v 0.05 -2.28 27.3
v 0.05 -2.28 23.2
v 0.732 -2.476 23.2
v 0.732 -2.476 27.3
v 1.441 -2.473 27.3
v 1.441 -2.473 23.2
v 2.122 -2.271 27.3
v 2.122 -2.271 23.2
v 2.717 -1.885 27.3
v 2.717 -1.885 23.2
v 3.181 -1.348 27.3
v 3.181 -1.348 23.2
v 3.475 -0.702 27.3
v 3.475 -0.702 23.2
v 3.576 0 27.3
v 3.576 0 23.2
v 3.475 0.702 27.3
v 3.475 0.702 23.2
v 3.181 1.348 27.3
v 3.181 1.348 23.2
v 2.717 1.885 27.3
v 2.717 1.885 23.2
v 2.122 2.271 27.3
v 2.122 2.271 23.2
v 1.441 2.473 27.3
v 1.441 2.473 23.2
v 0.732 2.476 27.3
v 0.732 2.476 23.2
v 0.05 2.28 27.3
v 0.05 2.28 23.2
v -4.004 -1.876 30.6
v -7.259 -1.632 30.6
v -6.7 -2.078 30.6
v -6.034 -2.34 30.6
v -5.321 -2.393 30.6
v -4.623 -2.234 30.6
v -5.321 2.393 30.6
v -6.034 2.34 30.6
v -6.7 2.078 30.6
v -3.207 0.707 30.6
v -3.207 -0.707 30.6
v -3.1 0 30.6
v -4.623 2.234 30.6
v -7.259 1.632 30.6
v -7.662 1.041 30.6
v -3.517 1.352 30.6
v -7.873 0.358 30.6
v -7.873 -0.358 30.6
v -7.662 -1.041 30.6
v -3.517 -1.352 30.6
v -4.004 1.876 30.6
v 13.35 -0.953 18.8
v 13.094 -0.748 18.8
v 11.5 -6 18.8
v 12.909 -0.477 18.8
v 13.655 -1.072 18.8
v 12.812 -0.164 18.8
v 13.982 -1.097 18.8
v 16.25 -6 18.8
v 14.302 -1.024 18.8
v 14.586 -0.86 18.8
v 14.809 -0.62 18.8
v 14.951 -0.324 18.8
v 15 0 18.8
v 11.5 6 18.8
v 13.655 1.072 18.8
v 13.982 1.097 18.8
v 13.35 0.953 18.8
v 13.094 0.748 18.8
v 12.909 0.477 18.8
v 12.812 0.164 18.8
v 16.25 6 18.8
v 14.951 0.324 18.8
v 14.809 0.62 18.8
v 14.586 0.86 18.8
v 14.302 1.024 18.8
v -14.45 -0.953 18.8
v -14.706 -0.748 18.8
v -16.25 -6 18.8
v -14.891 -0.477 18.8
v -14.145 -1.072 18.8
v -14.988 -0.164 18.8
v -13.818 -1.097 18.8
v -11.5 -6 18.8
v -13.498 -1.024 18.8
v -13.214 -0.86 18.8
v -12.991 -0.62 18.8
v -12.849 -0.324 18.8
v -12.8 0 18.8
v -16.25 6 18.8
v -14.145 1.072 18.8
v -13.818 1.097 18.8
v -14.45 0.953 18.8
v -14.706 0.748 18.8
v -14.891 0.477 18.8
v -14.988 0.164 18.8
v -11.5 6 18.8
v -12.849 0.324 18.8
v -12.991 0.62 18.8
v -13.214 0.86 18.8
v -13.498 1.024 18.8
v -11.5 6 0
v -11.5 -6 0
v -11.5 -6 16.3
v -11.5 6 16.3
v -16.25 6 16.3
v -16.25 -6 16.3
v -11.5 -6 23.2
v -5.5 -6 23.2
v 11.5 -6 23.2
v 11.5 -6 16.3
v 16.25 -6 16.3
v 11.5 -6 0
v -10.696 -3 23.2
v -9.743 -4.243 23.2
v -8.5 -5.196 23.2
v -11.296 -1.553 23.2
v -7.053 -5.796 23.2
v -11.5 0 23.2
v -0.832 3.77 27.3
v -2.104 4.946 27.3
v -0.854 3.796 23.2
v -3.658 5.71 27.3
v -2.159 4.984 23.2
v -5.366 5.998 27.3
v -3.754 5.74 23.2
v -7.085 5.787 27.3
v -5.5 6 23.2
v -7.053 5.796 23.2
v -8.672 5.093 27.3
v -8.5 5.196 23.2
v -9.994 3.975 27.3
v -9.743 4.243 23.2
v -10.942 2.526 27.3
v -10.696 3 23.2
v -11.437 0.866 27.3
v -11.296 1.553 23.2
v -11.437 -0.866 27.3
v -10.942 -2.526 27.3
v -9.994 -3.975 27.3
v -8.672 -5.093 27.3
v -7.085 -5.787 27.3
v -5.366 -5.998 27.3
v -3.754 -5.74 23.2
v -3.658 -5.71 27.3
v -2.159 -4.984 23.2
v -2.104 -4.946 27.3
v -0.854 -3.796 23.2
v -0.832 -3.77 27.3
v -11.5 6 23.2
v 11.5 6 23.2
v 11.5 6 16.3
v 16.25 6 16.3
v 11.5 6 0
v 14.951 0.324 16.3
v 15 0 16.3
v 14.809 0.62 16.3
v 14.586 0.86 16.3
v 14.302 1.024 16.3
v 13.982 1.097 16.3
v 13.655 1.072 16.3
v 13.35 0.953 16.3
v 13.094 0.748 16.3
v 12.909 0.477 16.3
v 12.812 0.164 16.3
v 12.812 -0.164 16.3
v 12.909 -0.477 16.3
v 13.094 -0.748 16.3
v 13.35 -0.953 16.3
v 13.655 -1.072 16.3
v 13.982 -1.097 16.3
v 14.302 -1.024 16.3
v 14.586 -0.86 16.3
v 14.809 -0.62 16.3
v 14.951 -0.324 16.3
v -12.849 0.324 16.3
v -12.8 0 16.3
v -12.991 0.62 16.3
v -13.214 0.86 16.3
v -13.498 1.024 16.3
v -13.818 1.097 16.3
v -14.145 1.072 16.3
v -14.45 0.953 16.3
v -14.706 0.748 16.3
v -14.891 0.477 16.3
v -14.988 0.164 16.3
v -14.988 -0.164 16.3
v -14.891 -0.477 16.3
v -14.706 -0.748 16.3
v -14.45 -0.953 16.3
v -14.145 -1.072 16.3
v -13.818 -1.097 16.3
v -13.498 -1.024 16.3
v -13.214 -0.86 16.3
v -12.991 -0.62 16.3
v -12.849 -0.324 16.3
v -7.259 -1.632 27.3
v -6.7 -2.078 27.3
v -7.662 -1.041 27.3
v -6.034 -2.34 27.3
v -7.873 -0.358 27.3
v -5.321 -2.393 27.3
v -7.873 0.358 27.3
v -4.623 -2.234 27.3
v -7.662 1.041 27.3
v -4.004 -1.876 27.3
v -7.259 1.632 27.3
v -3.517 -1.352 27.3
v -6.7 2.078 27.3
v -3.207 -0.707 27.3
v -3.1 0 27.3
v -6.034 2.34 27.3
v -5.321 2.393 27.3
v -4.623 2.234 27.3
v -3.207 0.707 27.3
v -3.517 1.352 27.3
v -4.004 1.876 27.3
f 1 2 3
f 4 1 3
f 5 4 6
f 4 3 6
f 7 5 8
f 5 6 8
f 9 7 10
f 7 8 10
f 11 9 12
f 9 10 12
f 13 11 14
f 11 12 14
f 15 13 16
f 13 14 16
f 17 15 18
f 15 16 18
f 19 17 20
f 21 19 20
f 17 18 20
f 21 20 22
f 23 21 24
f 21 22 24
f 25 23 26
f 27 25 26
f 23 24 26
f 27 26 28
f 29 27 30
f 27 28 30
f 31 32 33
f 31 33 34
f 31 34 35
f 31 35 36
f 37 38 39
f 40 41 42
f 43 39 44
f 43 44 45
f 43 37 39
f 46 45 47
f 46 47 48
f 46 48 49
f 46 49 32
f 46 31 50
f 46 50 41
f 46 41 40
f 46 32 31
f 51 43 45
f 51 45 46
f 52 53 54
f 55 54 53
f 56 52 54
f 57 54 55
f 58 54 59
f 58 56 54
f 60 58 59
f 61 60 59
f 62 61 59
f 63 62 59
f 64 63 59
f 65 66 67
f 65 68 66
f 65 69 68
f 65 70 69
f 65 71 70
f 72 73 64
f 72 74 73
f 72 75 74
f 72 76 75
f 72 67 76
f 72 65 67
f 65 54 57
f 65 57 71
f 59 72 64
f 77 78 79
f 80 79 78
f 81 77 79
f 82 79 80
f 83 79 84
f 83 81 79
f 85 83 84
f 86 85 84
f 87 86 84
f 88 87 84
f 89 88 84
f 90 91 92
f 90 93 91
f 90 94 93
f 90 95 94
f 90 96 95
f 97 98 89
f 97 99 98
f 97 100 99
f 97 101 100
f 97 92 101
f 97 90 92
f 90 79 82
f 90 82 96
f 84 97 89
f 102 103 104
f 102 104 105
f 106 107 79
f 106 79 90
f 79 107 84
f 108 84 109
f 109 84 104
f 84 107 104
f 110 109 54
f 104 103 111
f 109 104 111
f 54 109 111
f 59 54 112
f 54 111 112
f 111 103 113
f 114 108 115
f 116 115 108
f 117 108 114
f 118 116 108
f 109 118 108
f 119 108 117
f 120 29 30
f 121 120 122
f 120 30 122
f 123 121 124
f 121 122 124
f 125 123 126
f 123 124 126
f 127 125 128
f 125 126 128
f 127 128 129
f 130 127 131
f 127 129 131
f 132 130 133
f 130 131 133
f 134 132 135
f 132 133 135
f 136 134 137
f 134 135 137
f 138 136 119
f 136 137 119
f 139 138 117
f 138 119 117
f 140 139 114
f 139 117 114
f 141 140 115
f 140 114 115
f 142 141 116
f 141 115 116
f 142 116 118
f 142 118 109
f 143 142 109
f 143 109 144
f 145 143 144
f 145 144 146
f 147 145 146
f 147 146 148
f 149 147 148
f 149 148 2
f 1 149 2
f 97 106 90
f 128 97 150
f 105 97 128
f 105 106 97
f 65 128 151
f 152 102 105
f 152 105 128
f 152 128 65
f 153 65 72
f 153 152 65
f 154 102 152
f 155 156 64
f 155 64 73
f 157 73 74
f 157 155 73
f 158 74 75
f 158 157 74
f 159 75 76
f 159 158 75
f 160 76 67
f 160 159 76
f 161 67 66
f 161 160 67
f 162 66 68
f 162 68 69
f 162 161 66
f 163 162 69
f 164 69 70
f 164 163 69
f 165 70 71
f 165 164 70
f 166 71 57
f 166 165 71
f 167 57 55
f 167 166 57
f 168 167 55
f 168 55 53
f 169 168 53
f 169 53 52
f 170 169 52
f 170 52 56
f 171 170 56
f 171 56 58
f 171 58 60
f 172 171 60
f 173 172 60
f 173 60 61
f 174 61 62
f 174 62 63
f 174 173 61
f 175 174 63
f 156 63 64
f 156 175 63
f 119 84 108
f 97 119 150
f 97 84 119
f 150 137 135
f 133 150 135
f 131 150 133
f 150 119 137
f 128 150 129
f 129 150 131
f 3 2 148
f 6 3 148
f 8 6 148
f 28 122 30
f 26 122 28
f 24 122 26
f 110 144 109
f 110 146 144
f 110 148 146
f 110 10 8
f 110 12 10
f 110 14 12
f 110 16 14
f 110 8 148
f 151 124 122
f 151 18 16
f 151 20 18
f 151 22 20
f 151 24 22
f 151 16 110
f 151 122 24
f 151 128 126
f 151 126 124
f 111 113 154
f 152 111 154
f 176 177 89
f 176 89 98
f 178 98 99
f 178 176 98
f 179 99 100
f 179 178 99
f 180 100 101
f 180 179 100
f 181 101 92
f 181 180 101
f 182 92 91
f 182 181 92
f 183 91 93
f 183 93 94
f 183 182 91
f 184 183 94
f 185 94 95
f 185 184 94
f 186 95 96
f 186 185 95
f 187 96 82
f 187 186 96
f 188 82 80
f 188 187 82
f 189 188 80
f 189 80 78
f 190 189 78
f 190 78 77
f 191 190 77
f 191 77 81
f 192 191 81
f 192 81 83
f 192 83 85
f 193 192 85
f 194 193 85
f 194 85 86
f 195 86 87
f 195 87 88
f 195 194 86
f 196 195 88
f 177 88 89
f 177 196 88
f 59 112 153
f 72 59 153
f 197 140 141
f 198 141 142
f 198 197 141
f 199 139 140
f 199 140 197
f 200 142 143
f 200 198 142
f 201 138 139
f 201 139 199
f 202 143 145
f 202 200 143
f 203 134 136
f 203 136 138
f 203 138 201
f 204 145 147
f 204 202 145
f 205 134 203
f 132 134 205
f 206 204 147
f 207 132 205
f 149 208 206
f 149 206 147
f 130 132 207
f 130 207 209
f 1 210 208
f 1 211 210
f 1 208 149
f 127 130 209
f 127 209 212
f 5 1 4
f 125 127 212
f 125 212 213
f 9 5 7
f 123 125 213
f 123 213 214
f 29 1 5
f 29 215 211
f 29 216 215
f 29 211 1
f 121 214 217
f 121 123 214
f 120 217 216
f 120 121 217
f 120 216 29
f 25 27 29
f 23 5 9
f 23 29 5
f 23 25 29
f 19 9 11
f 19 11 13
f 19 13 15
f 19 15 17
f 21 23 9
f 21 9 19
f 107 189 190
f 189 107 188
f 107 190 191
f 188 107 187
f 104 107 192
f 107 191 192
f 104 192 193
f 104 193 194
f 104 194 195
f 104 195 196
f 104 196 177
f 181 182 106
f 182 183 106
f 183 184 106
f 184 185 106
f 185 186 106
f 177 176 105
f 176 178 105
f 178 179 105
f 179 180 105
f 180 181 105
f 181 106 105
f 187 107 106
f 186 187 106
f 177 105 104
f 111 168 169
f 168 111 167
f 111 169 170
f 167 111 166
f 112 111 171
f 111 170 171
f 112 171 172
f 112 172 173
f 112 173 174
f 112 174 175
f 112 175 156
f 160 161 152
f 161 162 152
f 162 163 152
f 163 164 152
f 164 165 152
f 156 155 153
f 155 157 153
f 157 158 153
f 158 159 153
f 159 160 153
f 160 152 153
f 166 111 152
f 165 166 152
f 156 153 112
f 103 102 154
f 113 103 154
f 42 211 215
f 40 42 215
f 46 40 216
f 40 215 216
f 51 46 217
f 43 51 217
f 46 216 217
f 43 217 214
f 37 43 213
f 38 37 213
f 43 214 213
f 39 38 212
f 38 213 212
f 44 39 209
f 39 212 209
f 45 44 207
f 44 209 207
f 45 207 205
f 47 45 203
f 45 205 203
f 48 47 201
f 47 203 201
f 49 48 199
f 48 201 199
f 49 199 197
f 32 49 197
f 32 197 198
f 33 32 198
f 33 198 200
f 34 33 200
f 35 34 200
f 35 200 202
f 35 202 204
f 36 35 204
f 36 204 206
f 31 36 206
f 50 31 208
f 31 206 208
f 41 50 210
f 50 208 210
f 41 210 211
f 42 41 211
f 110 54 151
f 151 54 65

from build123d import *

# Parameters (mm, degrees)
SKETCH_1_W      = 23
SKETCH_1_H      = 12
EXTRUDE_1_DEPTH = 16.3
SKETCH_2_W      = 32.5
SKETCH_2_H      = 12
SKETCH_2_R      = 1.1
EXTRUDE_2_DEPTH = 2.5
SKETCH_3_W      = 23
SKETCH_3_H      = 12
EXTRUDE_3_DEPTH = 4.4
EXTRUDE_4_DEPTH = 4.1
SKETCH_5_R      = 2.4
EXTRUDE_5_DEPTH = 3.3


with BuildPart() as part:
    # 草图1 → 凸台-拉伸1 (new body)
    with BuildSketch(Plane.XY):
        Rectangle(SKETCH_1_W, SKETCH_1_H)
    extrude(amount=EXTRUDE_1_DEPTH)

    # 草图2 → 凸台-拉伸2 (add)
    with BuildSketch(Plane.XY.offset(16.3)):
        Rectangle(SKETCH_2_W, SKETCH_2_H)
        with Locations((-13.9, 0)):
            Circle(SKETCH_2_R, mode=Mode.SUBTRACT)
        with Locations((13.9, 0)):
            Circle(SKETCH_2_R, mode=Mode.SUBTRACT)
    extrude(amount=EXTRUDE_2_DEPTH)

    # 草图3 → 凸台-拉伸3 (add)
    with BuildSketch(Plane.XY.offset(18.8)):
        Rectangle(SKETCH_3_W, SKETCH_3_H)
    extrude(amount=EXTRUDE_3_DEPTH)

    # 草图4 → 凸台-拉伸4 (add)
    with BuildSketch(Plane.XY.offset(23.2)):
        with BuildLine():
            ThreePointArc((0.049982862, 2.279844344), (-11.5, 0), (0.049982862, -2.279844344))
            ThreePointArc((0.049982862, -2.279844344), (3.575804369, 0), (0.049982862, 2.279844344))
        make_face()
    extrude(amount=EXTRUDE_4_DEPTH)

    # 草图5 → 凸台-拉伸5 (add)
    with BuildSketch(Plane.XY.offset(27.3)):
        with Locations((-5.5, 0)):
            Circle(SKETCH_5_R)
    extrude(amount=EXTRUDE_5_DEPTH)


solid = part.part
